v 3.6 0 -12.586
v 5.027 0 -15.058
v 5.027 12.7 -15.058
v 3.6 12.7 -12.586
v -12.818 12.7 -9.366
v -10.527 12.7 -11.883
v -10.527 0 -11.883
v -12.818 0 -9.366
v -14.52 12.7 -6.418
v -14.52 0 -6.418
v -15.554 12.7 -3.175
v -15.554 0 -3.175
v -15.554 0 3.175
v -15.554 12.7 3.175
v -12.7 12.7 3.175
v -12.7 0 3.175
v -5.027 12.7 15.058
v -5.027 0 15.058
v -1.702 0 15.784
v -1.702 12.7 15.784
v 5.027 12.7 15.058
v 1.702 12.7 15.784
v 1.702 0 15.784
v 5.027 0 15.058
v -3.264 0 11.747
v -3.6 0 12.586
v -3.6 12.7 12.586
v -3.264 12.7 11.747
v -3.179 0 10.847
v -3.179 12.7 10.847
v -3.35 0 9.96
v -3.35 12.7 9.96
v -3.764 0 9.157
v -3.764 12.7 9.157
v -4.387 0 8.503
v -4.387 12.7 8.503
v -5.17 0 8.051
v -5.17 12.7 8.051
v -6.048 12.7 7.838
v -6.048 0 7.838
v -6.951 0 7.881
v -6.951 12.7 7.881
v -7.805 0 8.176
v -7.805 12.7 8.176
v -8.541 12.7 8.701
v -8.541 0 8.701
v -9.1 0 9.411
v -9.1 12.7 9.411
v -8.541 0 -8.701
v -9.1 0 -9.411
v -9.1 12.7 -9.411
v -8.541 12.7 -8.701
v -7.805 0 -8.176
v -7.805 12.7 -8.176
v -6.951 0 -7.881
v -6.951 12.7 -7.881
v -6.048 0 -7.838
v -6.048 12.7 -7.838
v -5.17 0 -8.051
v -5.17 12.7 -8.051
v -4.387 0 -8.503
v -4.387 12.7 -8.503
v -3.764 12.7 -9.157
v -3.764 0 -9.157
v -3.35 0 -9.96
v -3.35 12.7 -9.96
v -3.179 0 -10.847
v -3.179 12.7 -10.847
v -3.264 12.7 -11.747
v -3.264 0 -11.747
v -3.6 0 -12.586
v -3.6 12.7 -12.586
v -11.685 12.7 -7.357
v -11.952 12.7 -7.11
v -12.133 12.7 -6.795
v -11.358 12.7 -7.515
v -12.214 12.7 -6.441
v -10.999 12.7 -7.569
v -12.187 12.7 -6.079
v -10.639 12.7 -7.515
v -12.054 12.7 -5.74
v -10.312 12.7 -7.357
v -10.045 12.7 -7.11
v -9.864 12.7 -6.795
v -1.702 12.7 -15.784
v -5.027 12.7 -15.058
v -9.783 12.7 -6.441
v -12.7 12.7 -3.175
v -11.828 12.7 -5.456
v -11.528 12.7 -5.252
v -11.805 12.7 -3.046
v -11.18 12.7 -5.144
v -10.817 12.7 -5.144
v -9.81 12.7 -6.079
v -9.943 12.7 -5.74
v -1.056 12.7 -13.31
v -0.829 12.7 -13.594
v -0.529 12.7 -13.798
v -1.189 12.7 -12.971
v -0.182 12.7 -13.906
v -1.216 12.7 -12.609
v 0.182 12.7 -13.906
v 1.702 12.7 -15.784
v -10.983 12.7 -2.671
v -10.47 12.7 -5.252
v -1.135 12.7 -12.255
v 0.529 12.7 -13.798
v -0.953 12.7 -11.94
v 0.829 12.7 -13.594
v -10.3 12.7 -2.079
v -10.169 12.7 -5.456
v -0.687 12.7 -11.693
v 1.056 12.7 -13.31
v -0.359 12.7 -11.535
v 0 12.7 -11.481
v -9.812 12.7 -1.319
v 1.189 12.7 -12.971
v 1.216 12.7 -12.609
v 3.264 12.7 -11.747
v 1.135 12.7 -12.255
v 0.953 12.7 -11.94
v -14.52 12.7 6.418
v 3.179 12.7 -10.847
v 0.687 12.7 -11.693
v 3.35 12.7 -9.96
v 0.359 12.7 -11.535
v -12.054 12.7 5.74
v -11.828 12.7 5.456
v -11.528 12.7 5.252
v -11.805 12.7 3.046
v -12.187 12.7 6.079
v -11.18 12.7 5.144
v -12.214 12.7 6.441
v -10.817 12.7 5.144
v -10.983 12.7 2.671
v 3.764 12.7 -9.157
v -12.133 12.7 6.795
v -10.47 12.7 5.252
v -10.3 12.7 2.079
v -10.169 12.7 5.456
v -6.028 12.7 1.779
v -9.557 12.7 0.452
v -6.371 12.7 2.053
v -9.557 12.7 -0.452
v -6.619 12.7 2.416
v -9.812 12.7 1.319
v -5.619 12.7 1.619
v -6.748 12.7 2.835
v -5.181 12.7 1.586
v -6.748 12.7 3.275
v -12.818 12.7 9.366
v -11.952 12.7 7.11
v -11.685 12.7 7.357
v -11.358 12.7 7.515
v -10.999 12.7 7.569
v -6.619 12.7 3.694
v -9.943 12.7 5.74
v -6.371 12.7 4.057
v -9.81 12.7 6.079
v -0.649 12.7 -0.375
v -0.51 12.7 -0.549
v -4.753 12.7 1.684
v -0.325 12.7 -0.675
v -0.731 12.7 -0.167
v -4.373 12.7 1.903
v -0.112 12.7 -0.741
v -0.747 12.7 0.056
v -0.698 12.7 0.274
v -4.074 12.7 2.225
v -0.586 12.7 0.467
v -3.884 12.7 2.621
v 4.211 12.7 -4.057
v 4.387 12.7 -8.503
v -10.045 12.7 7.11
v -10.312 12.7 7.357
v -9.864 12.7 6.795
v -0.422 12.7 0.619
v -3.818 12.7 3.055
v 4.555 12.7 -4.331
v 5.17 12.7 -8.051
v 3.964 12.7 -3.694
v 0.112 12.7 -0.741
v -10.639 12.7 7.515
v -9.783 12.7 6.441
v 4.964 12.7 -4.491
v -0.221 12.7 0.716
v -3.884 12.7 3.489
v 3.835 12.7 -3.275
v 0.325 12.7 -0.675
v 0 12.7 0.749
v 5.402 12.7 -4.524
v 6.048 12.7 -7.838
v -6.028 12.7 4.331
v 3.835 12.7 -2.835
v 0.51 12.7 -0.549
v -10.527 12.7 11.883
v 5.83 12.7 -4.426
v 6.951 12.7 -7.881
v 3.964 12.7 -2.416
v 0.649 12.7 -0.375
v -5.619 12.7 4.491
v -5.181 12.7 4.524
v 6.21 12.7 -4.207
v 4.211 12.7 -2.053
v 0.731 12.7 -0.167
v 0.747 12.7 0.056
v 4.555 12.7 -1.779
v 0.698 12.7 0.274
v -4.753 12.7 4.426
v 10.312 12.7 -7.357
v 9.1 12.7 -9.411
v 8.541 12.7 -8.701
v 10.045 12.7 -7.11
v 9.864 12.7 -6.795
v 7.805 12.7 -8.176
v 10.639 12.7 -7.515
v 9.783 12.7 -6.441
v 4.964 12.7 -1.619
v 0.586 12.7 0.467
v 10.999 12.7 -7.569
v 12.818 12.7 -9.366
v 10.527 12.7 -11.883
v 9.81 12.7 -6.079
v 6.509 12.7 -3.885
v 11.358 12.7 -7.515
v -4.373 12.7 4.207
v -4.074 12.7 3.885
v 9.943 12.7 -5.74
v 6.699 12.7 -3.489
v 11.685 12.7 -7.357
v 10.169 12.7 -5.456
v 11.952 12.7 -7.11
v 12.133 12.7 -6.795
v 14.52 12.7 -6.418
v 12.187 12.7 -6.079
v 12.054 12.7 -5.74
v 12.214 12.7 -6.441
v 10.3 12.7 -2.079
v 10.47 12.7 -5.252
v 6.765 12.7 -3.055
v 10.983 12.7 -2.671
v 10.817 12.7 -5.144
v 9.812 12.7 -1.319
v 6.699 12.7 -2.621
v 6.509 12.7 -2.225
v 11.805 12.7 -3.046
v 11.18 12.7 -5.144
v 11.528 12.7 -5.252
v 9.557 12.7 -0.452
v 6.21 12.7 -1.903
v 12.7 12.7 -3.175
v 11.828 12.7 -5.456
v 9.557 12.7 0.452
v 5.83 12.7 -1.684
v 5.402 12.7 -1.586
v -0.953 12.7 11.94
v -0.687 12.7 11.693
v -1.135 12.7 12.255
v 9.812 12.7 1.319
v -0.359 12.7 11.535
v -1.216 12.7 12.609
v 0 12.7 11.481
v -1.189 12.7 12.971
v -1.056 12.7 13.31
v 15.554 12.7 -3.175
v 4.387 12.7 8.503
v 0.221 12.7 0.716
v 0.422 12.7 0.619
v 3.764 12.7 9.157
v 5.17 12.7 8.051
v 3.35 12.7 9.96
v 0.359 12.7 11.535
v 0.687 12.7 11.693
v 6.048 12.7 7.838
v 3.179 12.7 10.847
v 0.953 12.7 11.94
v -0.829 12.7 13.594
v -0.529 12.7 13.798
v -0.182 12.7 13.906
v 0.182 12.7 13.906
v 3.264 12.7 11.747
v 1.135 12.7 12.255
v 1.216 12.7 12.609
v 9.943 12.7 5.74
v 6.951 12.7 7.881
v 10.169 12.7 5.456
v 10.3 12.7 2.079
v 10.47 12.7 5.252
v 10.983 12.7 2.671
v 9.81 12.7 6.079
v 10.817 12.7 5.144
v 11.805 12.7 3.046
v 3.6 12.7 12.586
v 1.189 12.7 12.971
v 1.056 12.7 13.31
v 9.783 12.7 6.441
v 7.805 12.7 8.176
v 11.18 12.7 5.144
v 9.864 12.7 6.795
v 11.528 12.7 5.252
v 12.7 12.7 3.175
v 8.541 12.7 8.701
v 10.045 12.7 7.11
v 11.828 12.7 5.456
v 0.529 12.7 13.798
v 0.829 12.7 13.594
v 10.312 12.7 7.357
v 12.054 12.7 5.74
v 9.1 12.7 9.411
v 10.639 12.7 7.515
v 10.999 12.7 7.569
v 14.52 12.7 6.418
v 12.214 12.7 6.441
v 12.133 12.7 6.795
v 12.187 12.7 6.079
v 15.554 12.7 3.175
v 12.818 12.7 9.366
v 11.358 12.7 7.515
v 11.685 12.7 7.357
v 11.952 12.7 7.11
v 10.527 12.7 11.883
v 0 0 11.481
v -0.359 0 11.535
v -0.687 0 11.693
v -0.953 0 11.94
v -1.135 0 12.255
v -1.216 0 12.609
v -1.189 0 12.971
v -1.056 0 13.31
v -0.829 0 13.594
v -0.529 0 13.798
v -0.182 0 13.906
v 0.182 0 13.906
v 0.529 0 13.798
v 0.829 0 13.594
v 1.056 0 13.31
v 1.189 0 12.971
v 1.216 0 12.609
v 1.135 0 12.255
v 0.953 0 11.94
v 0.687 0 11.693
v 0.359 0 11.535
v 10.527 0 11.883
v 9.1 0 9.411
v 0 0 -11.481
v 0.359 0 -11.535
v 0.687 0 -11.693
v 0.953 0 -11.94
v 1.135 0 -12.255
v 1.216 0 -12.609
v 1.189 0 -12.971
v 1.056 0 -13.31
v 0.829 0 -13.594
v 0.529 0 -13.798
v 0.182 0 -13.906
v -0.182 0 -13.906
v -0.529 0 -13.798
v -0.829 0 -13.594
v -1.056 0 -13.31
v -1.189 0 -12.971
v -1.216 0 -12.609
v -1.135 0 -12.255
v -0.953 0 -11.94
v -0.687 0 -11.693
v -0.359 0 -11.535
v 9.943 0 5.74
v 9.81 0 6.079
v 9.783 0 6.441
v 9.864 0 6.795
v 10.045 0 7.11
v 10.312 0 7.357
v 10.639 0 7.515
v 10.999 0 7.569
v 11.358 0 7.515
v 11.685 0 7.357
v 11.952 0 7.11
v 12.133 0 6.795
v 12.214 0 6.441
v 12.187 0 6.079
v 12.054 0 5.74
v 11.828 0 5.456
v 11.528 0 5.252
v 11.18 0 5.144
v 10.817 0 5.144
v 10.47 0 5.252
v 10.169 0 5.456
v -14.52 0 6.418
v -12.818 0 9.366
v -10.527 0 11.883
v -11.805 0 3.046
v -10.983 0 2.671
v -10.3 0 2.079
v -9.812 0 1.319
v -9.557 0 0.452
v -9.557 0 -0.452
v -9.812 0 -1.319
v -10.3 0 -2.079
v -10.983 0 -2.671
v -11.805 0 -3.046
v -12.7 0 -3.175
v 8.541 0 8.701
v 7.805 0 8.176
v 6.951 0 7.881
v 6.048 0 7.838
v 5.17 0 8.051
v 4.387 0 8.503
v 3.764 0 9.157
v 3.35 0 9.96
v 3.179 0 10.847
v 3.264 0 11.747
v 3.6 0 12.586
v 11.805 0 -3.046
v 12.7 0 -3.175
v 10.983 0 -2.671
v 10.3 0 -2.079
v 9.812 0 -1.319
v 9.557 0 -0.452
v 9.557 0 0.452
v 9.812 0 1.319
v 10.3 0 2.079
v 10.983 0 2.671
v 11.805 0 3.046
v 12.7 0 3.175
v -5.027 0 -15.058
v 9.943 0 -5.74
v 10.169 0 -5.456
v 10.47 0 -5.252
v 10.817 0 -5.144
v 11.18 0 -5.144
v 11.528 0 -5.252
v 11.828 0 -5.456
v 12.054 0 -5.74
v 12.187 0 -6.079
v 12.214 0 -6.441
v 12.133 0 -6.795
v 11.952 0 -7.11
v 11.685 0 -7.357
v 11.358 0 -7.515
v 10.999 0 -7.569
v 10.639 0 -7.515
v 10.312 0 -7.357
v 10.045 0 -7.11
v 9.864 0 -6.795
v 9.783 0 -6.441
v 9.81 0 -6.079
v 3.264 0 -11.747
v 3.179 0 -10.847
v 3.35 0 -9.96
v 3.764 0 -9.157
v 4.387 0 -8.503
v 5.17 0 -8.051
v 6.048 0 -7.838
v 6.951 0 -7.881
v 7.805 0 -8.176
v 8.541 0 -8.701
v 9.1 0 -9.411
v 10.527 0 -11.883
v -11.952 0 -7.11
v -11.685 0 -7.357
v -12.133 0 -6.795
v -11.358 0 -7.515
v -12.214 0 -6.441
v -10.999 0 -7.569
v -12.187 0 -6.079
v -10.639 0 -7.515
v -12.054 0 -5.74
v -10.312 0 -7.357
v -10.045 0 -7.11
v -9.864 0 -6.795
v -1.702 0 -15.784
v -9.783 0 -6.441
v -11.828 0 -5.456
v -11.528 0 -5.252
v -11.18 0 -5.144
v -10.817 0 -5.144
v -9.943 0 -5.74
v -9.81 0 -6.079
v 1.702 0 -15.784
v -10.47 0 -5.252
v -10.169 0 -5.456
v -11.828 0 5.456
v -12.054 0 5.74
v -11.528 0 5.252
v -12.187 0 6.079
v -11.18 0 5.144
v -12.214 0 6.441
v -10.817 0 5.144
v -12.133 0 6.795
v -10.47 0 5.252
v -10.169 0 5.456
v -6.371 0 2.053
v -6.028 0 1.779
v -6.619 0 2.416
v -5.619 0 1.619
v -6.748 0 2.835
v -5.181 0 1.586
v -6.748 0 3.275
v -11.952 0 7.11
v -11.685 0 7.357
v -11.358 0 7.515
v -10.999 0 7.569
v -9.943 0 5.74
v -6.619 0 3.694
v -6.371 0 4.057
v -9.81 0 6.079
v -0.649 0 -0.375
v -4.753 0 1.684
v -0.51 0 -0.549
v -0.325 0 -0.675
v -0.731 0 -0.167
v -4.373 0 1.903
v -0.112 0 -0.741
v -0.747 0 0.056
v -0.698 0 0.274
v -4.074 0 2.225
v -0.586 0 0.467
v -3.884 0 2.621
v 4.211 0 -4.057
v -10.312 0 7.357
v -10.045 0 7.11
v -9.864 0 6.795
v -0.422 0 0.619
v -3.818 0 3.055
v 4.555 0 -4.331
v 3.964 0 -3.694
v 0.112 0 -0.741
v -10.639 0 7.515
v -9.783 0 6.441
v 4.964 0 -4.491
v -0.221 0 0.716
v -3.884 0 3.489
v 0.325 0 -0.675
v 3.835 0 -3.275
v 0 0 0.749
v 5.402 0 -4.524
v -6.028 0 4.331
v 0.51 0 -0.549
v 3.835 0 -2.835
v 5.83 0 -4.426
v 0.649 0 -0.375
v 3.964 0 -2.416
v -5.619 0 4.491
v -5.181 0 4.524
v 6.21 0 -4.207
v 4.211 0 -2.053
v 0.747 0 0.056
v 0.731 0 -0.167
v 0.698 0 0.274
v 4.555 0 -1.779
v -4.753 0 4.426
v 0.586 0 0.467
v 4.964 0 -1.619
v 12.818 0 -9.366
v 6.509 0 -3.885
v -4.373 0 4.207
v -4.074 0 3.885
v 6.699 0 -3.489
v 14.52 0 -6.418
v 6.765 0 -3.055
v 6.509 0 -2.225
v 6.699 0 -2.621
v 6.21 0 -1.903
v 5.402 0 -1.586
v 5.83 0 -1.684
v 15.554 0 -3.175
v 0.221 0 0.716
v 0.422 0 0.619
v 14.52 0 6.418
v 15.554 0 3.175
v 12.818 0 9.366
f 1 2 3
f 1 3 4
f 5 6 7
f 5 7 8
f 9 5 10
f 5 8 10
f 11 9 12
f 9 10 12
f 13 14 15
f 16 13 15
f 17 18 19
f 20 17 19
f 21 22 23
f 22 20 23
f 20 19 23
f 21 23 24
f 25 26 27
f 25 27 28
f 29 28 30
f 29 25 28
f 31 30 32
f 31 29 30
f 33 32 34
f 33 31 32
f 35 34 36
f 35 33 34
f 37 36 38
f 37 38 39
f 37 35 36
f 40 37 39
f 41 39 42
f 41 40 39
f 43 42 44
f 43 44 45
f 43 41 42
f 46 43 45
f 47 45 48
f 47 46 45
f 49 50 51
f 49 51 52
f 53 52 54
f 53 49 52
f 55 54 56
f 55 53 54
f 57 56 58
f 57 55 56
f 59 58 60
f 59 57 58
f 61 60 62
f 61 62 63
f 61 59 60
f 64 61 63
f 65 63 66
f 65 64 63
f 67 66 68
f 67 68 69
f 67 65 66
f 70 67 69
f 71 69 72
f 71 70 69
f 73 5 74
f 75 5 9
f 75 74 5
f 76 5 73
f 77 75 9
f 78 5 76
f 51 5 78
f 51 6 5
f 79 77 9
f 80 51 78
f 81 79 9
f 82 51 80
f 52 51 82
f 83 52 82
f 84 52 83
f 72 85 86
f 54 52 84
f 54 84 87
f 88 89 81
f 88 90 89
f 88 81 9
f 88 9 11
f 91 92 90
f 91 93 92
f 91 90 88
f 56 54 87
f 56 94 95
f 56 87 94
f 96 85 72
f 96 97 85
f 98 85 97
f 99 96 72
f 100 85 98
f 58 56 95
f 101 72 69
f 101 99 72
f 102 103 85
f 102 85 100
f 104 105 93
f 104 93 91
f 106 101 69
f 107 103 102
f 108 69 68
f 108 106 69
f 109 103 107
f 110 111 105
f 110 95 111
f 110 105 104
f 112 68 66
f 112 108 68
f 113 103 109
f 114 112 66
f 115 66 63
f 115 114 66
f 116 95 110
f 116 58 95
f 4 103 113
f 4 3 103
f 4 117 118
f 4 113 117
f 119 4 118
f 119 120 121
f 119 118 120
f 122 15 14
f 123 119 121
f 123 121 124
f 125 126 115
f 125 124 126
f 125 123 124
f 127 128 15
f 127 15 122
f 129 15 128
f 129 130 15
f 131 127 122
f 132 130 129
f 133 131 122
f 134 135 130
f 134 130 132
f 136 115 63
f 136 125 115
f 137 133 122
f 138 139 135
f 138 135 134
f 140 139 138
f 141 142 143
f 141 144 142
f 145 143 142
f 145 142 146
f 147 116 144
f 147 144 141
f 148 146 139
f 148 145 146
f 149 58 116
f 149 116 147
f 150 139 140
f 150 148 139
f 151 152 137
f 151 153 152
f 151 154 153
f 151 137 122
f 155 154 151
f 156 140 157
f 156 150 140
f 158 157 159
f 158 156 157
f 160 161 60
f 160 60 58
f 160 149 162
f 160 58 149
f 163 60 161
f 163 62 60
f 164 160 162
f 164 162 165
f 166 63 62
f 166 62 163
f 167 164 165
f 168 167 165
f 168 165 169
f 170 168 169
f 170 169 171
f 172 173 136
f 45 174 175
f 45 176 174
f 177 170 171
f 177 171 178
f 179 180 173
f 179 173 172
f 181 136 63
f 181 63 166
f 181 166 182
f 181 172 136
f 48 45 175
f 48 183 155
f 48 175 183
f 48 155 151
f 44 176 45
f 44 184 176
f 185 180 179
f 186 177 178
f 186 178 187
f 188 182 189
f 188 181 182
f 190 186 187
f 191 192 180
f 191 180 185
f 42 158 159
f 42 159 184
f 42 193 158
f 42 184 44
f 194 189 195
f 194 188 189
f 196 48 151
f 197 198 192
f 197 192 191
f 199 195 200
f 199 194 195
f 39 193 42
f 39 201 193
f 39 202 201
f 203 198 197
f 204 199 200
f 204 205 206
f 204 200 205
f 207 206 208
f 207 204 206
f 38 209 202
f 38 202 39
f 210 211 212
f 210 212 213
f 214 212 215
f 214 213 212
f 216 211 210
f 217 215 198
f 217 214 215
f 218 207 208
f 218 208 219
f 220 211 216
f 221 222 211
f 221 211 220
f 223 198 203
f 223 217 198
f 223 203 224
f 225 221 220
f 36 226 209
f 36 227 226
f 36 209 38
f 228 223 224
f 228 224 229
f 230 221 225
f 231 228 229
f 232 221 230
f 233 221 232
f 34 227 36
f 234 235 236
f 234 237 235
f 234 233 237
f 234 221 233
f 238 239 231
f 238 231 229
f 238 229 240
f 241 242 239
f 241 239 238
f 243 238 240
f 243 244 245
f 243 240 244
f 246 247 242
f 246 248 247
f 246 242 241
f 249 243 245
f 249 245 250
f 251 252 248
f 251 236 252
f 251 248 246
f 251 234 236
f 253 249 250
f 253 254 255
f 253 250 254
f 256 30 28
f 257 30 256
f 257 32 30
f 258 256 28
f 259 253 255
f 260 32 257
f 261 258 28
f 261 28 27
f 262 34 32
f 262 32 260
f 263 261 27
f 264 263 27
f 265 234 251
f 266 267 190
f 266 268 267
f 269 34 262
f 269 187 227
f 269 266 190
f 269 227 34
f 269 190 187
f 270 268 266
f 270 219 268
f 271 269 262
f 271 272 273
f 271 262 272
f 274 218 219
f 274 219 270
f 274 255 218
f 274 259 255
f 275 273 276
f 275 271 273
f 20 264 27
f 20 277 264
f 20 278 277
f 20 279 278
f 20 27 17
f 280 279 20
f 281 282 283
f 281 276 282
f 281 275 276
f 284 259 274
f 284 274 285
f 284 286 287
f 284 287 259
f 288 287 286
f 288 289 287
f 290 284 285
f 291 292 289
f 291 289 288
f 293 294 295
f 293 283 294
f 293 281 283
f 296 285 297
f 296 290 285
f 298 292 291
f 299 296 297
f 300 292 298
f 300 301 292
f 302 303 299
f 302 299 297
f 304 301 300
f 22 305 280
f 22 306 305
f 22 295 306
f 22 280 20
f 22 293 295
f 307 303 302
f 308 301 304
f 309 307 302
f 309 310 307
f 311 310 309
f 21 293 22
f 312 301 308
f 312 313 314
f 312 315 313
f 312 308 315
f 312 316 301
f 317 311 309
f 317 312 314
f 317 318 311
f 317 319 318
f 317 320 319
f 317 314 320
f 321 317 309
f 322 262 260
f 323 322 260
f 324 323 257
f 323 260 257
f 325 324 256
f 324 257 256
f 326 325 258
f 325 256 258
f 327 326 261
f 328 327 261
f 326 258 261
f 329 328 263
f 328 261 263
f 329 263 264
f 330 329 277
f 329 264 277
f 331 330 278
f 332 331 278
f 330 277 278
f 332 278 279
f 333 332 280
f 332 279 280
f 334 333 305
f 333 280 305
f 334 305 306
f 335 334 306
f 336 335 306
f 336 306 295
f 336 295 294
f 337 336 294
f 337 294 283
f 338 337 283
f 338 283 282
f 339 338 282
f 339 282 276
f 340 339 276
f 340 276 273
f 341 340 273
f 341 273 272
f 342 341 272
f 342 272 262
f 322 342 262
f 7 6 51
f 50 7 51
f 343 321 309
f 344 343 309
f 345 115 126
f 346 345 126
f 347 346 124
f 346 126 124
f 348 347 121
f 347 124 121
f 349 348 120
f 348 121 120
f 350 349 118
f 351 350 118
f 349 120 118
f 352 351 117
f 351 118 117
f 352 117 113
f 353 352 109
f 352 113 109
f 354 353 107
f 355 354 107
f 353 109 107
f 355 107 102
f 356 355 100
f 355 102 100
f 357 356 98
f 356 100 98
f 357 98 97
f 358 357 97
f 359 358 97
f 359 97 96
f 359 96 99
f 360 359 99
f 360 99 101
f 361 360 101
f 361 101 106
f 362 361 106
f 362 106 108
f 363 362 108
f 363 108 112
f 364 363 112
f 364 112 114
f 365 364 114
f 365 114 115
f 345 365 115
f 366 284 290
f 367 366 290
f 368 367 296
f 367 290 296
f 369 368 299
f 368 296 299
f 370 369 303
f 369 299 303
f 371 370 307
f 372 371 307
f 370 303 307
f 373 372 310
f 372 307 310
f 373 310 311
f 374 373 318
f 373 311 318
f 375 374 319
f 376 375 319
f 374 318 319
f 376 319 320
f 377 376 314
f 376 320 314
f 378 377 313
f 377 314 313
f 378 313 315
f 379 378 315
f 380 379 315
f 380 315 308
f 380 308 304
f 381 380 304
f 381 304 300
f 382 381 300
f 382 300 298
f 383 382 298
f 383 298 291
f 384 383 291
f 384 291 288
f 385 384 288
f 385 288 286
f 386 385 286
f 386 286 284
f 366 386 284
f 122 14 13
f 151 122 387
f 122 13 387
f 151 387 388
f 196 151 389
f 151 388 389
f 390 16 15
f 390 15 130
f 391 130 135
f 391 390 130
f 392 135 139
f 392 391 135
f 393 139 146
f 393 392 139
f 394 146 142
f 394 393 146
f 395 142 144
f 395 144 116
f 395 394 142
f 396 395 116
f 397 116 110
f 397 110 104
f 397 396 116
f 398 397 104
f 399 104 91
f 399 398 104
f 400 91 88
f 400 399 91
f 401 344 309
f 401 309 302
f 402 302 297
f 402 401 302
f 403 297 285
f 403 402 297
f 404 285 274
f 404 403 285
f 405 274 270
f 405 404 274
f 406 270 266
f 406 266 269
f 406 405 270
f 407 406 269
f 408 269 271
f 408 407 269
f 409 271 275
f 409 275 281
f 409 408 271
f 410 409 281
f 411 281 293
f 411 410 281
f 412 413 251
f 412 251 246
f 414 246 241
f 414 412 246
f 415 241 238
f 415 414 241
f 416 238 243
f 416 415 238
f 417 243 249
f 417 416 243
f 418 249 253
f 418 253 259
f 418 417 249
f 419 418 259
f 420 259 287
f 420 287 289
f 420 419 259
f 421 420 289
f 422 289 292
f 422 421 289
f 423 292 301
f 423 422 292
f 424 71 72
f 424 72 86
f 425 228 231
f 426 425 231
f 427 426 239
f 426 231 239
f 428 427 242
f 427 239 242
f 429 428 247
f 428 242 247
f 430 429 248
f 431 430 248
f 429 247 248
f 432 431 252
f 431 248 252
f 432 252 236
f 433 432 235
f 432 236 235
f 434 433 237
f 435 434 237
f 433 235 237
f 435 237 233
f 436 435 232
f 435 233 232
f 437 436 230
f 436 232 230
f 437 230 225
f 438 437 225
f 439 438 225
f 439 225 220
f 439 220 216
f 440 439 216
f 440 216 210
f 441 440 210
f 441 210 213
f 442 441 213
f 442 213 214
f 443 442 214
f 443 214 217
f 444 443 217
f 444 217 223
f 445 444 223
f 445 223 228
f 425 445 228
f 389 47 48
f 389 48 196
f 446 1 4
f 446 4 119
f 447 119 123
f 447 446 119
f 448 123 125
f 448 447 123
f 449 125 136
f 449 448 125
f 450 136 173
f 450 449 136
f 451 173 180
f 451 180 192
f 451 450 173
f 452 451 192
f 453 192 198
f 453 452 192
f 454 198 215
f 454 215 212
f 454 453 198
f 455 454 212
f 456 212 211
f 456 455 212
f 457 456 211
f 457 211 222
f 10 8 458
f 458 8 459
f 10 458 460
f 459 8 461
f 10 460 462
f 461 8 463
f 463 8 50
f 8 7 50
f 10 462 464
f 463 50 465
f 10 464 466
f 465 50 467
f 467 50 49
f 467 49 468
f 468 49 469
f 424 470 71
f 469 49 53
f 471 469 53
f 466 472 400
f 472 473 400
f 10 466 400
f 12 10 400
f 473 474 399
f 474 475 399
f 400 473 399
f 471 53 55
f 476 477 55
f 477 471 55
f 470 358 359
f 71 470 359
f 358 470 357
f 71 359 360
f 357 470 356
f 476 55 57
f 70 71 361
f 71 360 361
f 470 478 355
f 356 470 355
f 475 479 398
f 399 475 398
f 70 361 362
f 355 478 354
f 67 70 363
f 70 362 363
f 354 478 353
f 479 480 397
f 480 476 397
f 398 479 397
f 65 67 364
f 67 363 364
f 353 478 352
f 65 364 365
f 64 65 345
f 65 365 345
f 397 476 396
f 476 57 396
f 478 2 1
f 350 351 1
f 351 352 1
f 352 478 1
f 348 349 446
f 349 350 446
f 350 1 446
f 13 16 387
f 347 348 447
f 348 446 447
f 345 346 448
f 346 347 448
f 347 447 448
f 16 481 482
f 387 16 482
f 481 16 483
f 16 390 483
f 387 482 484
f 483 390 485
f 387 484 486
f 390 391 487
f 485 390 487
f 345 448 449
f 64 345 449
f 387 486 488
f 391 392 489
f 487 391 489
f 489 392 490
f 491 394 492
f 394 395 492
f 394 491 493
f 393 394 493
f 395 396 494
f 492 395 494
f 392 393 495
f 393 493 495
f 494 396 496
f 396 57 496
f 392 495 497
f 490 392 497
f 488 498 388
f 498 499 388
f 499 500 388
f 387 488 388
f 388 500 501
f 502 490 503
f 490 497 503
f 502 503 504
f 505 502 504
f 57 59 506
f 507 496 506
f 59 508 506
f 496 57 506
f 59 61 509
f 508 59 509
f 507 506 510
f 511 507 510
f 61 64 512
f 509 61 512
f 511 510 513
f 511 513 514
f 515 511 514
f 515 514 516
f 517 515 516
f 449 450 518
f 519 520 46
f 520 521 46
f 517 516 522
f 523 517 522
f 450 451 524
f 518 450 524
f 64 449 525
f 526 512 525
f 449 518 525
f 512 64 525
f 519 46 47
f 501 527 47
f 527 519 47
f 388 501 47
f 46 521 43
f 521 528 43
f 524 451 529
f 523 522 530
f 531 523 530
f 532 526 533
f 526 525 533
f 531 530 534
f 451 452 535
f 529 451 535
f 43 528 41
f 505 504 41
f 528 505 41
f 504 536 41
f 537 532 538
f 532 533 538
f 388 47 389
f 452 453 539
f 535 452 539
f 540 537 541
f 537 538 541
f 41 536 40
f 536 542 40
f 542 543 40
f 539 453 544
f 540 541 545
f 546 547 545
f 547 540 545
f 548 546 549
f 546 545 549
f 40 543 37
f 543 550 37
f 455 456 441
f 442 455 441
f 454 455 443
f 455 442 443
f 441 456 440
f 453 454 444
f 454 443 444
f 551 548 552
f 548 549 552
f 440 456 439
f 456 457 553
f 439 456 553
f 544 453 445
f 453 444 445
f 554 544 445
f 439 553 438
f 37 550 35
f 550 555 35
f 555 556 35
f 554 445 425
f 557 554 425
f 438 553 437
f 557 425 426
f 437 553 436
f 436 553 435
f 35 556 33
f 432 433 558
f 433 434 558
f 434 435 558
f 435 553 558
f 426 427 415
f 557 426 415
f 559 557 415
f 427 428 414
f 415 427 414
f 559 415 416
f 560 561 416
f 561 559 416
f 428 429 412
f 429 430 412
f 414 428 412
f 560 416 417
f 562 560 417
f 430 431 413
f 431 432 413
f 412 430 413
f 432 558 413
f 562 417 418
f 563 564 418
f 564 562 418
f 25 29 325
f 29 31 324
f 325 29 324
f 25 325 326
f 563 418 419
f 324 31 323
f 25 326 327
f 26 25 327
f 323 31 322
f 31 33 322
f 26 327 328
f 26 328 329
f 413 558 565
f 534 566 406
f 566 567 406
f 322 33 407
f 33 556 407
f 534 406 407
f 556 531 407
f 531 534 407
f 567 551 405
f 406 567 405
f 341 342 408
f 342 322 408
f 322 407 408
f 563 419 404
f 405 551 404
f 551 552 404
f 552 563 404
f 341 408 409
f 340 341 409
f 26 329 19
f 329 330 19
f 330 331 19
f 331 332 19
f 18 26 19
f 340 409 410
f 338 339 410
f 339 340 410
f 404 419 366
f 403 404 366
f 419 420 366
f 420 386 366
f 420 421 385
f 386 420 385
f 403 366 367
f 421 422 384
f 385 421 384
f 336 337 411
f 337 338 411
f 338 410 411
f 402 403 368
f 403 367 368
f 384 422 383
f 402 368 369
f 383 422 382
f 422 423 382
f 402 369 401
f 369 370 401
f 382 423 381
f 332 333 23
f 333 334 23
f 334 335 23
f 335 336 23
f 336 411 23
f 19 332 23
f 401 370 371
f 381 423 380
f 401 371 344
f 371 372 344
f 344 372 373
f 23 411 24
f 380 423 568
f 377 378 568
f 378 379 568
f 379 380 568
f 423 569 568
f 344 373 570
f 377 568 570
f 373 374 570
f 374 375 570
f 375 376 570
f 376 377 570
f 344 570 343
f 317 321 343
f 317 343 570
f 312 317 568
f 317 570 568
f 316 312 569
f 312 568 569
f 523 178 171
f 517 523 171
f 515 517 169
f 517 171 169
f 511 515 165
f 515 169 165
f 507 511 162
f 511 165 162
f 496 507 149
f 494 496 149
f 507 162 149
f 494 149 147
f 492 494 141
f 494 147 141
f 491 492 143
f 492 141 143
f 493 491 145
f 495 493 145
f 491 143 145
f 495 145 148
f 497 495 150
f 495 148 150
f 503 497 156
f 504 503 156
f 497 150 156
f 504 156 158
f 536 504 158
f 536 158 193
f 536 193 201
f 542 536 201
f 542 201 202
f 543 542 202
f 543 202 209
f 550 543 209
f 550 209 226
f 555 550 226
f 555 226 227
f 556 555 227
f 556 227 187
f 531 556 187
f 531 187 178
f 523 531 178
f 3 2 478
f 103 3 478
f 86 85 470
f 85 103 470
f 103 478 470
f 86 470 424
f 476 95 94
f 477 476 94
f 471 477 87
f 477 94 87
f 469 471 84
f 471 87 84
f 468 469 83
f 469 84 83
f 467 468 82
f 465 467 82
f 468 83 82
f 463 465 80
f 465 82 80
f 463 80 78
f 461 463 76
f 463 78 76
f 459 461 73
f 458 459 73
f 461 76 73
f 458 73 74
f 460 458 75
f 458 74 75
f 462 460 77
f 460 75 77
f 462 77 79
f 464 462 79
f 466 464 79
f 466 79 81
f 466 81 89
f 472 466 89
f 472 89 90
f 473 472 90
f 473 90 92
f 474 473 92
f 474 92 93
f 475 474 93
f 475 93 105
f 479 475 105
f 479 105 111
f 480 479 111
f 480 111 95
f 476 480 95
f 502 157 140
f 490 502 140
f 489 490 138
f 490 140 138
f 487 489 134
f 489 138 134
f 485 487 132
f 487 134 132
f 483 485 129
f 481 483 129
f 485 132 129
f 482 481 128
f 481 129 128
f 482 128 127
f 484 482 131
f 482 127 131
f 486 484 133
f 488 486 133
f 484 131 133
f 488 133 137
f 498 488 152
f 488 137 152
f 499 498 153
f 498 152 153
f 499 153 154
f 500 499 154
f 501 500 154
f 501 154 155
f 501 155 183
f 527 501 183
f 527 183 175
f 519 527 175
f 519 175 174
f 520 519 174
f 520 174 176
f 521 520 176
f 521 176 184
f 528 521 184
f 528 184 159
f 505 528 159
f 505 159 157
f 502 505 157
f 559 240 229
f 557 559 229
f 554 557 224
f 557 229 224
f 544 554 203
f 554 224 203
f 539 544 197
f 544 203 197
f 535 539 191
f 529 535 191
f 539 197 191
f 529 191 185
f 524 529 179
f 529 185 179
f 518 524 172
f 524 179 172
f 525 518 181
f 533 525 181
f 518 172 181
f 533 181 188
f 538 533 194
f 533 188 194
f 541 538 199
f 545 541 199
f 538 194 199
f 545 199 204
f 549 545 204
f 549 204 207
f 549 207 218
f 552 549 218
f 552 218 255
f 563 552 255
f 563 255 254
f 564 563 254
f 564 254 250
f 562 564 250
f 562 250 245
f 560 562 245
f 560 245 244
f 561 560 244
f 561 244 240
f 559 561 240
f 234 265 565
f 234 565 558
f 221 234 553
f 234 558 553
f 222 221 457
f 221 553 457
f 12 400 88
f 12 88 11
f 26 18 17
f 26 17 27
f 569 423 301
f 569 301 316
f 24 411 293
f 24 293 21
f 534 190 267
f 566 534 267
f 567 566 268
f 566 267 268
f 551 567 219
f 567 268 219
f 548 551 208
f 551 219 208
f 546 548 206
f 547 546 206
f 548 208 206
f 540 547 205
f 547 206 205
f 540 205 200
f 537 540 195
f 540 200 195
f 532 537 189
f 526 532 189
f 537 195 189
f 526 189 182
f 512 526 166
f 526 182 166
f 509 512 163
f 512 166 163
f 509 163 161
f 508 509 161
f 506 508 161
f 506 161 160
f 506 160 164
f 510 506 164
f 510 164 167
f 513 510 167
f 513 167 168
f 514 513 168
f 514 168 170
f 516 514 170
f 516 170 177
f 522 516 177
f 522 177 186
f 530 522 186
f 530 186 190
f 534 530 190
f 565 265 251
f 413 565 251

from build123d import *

# Parameters (mm, degrees)
SKETCH1_R                   = 15.875
BOSS_EXTRUDE1_DEPTH         = 12.7
SKETCH2_R                   = 0.7493
CUT_EXTRUDE1_DEPTH          = 20
SKETCH3_R                   = 1.2192
CUT_EXTRUDE3_DEPTH          = 26.793821935
CUT_EXTRUDE4_START          = -20
CUT_EXTRUDE4_DEPTH          = 20
CIRPATTERN1_COUNT           = 6
F_32_0_116_DIAMETER_HOLE2_D = 2.9464


with BuildPart() as part:
    # Sketch1 → Boss-Extrude1 (new body)
    with BuildSketch(Plane(origin=(0, 0, 0), x_dir=(1, 0, 0), z_dir=(0, 1, 0))):
        with Locations(Location((0, 0, 0), (0, 0, 270))):
            Circle(SKETCH1_R)
    extrude(amount=BOSS_EXTRUDE1_DEPTH)

    # Sketch2 → Cut-Extrude1 (cut)
    with BuildSketch(Plane(origin=(0, 12.7, 0), x_dir=(1, 0, 0), z_dir=(0, 1, 0))):
        with Locations(Location((0, 0, 0), (0, 0, 270))):
            Circle(SKETCH2_R)
    extrude(amount=-CUT_EXTRUDE1_DEPTH, mode=Mode.SUBTRACT)

    # Sketch3 → Cut-Extrude3 (cut, through all)
    with BuildSketch(Plane(origin=(0, 12.7, 0), x_dir=(1, 0, 0), z_dir=(0, 1, 0))):
        with Locations(Location((0, 12.7, 0), (0, 0, 270))):
            Circle(SKETCH3_R)
    cut_extrude3 = extrude(amount=-CUT_EXTRUDE3_DEPTH, mode=Mode.SUBTRACT)

    # Sketch4 → Cut-Extrude4 (cut)
    with BuildSketch(Plane(origin=(0, 12.7, 0), x_dir=(1, 0, 0), z_dir=(0, 1, 0)).offset(CUT_EXTRUDE4_START)):
        with BuildLine():
            ThreePointArc((12.7, 3.175), (9.525, 0), (12.7, -3.175))
            Line((12.7, -3.175), (12.7, 3.175))
        make_face()
        with BuildLine():
            Line((12.7, 3.175), (12.7, -3.175))
            ThreePointArc((12.7, -3.175), (14.94506403, -2.24506403), (15.875, 0))
            ThreePointArc((15.875, 0), (14.94506403, 2.24506403), (12.7, 3.175))
        make_face()
        with BuildLine():
            ThreePointArc((15.875, 0), (15.794611429, -1.595579772), (15.554259867, -3.175))
            Line((15.554259867, -3.175), (20.958617126, -3.175))
            Line((20.958617126, -3.175), (20.958617126, 3.175))
            Line((20.958617126, 3.175), (15.554259867, 3.175))
            ThreePointArc((15.554259867, 3.175), (15.794611429, 1.595579772), (15.875, 0))
        make_face()
        with BuildLine():
            Line((15.554259867, 3.175), (12.7, 3.175))
            ThreePointArc((12.7, 3.175), (14.94506403, 2.24506403), (15.875, 0))
            ThreePointArc((15.875, 0), (15.794611429, 1.595579772), (15.554259867, 3.175))
        make_face()
        with BuildLine():
            ThreePointArc((15.875, 0), (14.94506403, -2.24506403), (12.7, -3.175))
            Line((12.7, -3.175), (15.554259867, -3.175))
            ThreePointArc((15.554259867, -3.175), (15.794611429, -1.595579772), (15.875, 0))
        make_face()
    cut_extrude4 = extrude(amount=CUT_EXTRUDE4_DEPTH, mode=Mode.SUBTRACT)

    # CirPattern1: Cut-Extrude3, Cut-Extrude4 ×6 about axis
    cirpattern1_axis = Axis((0, 0, 0), (0, 1, 0))
    add([cut_extrude3.rotate(cirpattern1_axis, i * 360 / CIRPATTERN1_COUNT) for i in range(1, CIRPATTERN1_COUNT)], mode=Mode.SUBTRACT)
    add([cut_extrude4.rotate(cirpattern1_axis, i * 360 / CIRPATTERN1_COUNT) for i in range(1, CIRPATTERN1_COUNT)], mode=Mode.SUBTRACT)

    # #32 (0.116) Diameter Hole2 (through all)
    with Locations(Plane(origin=(0, 0, 0), x_dir=(-1, 0, 0), z_dir=(0, -1, 0))):
        with Locations((5.291415217, -3.055), (-5.291415217, 3.055)):
            Hole(F_32_0_116_DIAMETER_HOLE2_D / 2)


solid = part.part
